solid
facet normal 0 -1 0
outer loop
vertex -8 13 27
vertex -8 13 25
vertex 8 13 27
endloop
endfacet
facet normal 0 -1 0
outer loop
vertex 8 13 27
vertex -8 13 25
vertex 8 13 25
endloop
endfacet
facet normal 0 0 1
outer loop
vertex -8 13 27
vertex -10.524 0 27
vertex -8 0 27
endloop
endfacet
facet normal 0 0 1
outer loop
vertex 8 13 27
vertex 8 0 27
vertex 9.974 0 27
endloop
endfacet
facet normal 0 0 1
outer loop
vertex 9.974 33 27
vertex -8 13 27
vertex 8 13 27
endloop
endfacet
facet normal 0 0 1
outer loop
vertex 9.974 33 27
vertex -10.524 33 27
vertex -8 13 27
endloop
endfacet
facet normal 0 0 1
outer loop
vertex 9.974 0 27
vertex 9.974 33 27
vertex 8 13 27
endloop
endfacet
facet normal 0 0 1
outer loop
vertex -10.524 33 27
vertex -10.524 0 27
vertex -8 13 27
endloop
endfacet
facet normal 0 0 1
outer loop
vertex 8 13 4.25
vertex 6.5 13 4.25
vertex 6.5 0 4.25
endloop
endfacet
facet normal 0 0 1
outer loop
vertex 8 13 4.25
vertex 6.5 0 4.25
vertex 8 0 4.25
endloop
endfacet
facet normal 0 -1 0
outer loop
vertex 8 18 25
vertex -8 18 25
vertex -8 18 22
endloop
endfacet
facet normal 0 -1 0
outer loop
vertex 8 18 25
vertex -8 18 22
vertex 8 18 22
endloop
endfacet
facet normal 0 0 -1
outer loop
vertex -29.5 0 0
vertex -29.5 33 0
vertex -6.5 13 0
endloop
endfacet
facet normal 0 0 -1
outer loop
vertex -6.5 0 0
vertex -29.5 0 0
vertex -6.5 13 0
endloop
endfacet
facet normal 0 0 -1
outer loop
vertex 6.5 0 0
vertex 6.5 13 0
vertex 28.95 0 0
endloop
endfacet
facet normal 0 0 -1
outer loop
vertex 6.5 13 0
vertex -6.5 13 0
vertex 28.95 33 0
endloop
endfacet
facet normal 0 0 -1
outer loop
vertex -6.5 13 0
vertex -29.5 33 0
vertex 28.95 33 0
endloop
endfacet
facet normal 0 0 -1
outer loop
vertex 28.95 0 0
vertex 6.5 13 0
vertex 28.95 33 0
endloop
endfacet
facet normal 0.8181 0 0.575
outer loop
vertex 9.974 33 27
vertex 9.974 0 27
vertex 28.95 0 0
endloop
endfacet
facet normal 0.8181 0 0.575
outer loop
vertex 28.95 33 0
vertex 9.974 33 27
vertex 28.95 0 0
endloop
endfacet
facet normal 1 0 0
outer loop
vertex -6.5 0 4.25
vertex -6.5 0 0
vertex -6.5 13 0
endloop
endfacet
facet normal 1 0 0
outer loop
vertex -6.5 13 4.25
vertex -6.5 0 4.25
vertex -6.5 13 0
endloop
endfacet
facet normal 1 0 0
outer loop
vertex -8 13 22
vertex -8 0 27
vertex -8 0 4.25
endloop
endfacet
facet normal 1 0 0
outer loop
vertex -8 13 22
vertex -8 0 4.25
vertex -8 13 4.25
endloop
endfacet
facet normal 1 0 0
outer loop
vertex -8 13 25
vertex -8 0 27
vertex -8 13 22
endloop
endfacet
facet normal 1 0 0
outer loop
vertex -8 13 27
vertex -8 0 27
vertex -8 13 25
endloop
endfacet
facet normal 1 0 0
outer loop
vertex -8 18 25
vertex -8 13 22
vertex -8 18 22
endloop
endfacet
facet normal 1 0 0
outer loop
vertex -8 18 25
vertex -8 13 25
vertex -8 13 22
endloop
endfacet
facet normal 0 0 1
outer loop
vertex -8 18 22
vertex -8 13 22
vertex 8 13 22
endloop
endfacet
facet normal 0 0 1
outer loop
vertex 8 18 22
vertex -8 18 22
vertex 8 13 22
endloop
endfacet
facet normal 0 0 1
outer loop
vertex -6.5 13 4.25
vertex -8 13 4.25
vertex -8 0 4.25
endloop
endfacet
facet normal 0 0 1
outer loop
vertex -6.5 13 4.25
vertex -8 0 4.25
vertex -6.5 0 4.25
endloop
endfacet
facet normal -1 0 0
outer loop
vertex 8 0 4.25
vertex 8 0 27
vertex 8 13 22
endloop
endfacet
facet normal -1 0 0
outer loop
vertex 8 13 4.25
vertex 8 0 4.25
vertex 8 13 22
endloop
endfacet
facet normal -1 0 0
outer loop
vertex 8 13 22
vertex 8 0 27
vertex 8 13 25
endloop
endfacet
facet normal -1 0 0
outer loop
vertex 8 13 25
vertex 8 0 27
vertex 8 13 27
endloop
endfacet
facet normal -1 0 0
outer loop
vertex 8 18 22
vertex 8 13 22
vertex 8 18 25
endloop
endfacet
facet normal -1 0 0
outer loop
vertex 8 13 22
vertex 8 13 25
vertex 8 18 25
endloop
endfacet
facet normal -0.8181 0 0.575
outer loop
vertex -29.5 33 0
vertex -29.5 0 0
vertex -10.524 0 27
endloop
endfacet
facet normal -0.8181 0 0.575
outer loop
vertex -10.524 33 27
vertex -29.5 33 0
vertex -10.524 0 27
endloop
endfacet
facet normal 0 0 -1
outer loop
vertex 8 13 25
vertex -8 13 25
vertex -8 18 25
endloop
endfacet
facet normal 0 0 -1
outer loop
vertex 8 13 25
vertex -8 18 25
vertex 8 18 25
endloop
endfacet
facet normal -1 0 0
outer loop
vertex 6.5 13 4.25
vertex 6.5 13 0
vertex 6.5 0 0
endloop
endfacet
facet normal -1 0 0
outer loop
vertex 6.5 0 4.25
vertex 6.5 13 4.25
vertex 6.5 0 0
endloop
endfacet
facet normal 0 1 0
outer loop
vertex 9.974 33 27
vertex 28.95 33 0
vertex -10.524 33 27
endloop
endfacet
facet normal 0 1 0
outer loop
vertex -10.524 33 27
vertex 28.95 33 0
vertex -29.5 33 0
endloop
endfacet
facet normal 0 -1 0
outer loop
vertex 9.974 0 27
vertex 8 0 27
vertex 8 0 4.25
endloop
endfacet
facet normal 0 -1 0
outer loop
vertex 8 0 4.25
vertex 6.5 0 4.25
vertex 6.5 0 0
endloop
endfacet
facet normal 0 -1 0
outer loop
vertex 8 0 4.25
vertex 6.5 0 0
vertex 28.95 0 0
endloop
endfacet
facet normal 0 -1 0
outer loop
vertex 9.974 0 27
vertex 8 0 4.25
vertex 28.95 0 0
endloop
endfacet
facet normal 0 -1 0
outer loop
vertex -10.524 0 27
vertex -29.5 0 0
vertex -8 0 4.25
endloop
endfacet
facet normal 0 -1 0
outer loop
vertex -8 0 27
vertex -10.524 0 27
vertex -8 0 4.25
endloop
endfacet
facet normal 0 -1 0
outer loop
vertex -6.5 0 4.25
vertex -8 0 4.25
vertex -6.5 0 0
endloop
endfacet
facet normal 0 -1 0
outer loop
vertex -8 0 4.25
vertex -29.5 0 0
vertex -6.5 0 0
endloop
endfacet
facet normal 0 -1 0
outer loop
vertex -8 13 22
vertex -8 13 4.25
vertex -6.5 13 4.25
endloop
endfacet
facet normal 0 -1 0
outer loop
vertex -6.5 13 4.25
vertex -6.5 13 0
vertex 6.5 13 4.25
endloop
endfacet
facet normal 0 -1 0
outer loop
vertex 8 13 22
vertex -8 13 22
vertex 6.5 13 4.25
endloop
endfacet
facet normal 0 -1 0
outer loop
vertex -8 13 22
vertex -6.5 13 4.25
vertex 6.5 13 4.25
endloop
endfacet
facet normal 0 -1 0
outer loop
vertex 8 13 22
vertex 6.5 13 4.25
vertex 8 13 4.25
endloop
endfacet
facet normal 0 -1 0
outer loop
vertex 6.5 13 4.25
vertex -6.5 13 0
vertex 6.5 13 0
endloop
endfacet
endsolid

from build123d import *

# Parameters (mm, degrees)
F1_DEPTH = 27
F3_DEPTH = 33
F4_W     = 1.5
F4_H     = 13
F5_DEPTH = 22.75
F6_W     = 16
F6_H     = 3
F7_DEPTH = 5


with BuildPart() as f1:
    # F0 (on Top) → F1 (new body)
    with BuildSketch(Plane.XY):
        Polygon((28.95, 33), (-29.5, 33), (-29.5, 0), (-6.5, 0), (-6.5, 13), (6.5, 13), (6.5, 0), (28.95, 0), align=None)
    extrude(amount=F1_DEPTH)

    # F2 (on face) → F3 (cut, through all)
    with BuildSketch(Plane.XZ):
        Polygon((28.95, 0), (28.95, 27), (9.974082, 27), align=None)
        Polygon((-29.5, 0), (-10.524082, 27), (-29.454212, 27), (-29.5, 27), align=None)
    extrude(amount=-F3_DEPTH, mode=Mode.SUBTRACT)

    # F4 (on face) → F5 (cut)
    with BuildSketch(Plane.XY.offset(27)):
        with Locations((-7.25, 6.5)):
            Rectangle(F4_W, F4_H)
        with Locations((7.25, 6.5)):
            Rectangle(F4_W, F4_H)
    extrude(amount=-F5_DEPTH, mode=Mode.SUBTRACT)

    # F6 (on face) → F7 (cut)
    with BuildSketch(Plane.XZ.offset(-13)):
        with Locations((0, 23.5)):
            Rectangle(F6_W, F6_H)
    extrude(amount=-F7_DEPTH, mode=Mode.SUBTRACT)


solid = f1.part
